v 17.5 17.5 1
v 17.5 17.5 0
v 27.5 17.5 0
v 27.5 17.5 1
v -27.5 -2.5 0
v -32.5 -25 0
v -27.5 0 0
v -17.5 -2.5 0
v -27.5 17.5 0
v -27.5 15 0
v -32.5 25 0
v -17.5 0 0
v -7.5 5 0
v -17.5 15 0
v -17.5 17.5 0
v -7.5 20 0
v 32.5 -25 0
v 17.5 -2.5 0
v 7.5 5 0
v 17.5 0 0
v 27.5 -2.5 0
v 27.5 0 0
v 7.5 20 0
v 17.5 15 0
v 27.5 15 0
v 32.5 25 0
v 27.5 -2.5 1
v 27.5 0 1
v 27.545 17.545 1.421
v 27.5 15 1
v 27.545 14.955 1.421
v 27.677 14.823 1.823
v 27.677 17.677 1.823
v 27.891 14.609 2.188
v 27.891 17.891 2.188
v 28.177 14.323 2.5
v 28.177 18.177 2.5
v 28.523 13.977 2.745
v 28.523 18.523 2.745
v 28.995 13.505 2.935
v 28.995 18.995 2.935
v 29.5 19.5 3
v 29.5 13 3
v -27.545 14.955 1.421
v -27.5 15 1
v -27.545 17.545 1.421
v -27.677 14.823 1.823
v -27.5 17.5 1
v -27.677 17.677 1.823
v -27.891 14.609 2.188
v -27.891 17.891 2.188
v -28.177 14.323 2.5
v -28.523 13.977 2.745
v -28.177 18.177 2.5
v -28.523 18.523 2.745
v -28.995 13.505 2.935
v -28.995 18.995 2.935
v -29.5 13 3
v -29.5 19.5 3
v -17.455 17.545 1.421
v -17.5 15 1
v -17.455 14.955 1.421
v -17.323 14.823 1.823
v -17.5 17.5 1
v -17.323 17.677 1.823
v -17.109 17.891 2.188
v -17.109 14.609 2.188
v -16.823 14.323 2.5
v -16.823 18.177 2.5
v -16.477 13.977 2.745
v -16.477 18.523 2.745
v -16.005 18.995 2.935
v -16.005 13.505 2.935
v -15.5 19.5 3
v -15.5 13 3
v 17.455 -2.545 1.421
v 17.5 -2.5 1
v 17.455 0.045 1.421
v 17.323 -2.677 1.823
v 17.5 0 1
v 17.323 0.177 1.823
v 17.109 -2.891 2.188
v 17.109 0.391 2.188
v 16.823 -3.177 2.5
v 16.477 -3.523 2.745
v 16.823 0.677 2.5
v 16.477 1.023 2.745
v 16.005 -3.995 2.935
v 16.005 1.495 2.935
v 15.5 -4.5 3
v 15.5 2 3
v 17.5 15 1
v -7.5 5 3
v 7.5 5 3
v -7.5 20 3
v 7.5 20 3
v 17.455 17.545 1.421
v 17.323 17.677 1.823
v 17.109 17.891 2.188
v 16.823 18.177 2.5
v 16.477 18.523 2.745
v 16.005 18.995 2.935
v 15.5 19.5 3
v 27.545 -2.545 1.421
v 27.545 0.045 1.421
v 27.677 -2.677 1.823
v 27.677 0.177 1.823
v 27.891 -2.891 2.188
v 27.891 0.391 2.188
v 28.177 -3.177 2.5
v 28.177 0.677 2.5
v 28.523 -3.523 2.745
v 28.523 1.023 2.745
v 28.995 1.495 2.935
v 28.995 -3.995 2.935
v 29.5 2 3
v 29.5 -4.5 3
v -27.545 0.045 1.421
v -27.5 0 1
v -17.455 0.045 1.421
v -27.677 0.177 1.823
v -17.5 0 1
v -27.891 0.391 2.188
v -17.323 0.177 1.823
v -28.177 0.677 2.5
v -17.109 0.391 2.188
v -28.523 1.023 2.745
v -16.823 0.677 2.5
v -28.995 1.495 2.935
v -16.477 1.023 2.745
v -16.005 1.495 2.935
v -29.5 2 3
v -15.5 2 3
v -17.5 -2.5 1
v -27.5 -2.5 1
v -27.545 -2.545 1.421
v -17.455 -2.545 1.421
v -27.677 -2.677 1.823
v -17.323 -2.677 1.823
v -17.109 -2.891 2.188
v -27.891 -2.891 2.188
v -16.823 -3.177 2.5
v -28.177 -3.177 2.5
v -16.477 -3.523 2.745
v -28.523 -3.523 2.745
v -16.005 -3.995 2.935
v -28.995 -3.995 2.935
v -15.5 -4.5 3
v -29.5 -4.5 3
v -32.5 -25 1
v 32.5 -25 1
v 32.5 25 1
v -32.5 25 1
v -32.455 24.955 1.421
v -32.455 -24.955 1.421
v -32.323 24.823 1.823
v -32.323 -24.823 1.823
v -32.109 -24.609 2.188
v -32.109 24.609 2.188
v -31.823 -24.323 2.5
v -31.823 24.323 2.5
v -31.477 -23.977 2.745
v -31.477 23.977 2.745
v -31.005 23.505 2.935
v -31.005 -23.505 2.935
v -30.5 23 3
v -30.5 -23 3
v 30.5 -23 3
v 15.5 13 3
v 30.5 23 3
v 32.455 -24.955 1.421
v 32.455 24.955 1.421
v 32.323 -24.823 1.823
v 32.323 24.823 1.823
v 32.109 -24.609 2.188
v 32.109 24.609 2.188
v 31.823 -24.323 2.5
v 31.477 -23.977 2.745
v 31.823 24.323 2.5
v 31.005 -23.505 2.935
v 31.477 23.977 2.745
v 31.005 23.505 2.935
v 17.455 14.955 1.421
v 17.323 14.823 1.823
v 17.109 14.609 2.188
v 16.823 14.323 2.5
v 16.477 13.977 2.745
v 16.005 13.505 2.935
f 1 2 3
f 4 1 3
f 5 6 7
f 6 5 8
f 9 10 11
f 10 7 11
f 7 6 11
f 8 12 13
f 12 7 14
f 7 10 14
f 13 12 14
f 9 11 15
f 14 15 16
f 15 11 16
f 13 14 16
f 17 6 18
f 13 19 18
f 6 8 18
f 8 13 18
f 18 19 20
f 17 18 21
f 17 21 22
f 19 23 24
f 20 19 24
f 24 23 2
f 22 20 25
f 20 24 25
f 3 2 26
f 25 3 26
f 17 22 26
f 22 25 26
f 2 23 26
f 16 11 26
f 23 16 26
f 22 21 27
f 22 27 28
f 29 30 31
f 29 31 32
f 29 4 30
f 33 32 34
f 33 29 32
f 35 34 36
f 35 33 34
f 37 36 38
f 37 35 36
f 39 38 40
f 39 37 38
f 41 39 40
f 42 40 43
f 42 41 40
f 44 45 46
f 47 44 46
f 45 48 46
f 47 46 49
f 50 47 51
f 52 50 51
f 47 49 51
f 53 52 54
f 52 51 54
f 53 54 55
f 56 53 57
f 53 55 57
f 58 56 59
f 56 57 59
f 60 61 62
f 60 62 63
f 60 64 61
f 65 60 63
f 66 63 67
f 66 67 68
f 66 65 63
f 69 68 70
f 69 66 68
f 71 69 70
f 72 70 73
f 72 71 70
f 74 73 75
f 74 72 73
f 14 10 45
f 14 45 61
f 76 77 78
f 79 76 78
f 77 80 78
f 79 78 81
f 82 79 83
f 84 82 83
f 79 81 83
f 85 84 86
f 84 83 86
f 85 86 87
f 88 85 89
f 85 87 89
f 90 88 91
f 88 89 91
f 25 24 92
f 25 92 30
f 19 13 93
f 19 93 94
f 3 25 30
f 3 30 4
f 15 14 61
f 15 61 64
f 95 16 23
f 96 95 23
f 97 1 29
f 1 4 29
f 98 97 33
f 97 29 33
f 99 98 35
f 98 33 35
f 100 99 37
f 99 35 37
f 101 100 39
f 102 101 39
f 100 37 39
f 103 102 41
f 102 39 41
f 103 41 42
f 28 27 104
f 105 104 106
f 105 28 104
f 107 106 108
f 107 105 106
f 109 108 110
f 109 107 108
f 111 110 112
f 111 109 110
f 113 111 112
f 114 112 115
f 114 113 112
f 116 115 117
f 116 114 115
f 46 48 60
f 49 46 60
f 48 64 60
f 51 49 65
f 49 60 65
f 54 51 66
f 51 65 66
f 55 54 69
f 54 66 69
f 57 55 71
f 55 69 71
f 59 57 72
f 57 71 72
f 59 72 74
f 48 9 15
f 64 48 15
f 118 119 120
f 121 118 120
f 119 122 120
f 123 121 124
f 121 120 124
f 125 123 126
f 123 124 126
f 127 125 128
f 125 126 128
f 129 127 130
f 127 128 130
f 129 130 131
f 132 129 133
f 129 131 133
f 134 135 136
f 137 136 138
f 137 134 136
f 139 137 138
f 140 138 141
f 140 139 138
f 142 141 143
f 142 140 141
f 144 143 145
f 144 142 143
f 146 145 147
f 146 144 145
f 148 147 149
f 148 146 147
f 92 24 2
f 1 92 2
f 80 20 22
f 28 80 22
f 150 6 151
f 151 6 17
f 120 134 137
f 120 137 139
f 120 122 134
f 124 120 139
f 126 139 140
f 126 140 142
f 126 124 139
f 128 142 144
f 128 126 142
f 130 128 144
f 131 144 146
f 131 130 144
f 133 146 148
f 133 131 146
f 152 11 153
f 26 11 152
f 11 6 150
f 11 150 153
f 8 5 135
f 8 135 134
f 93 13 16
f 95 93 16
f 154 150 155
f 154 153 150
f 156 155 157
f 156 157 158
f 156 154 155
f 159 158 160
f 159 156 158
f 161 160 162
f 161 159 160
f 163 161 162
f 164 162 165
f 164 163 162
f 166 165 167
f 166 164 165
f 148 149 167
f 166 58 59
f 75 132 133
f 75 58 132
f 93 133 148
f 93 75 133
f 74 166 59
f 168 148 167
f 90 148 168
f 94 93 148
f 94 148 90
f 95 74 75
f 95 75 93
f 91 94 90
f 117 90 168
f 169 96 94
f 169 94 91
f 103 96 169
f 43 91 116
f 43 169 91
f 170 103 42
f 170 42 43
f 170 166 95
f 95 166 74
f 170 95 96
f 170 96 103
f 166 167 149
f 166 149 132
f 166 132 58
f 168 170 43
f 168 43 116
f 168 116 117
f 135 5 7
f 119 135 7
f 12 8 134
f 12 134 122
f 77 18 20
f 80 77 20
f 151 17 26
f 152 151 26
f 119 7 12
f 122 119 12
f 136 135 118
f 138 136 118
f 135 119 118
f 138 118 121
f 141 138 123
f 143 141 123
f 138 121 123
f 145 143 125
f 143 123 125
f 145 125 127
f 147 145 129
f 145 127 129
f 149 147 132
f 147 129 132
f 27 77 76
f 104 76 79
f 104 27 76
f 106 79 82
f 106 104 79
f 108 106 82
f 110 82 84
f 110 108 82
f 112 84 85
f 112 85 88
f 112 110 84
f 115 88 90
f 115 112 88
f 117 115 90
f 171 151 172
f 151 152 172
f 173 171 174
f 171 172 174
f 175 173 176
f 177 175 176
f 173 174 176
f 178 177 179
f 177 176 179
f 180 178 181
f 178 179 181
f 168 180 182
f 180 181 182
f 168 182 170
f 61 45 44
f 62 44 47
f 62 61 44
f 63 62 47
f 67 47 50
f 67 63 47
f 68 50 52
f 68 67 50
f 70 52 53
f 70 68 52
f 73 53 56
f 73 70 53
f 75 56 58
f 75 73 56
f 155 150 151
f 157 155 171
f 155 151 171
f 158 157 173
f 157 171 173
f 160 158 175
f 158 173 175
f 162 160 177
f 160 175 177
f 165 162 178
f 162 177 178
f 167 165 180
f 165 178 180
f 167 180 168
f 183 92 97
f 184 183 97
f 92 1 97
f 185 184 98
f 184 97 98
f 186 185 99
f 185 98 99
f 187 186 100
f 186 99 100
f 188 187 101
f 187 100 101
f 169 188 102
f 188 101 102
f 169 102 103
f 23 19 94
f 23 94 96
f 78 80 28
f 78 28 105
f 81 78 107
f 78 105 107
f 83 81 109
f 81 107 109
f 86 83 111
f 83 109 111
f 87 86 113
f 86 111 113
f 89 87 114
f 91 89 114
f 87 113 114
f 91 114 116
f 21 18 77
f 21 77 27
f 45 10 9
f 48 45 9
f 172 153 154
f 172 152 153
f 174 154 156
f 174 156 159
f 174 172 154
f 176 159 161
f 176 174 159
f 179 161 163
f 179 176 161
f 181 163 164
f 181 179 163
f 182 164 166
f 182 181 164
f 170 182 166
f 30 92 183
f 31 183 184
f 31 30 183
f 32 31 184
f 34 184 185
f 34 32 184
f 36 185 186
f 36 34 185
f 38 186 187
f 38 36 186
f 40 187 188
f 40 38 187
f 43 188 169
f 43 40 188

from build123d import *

# Parameters (mm, degrees)
F0_W     = 65
F0_H     = 50
F0_W_2   = 10
F0_H_2   = 2.5
F0_W_3   = 15
F0_H_3   = 15
F1_DEPTH = 3
F2_R     = 2


with BuildPart() as f1:
    # F0 (on Top) → F1 (new body)
    with BuildSketch(Plane.XY):
        Rectangle(F0_W, F0_H)
        with Locations((-22.5, -1.25)):
            Rectangle(F0_W_2, F0_H_2, mode=Mode.SUBTRACT)
        with Locations((22.5, -1.25)):
            Rectangle(F0_W_2, F0_H_2, mode=Mode.SUBTRACT)
        with Locations((-22.5, 16.25)):
            Rectangle(F0_W_2, F0_H_2, mode=Mode.SUBTRACT)
        with Locations((0, 12.5)):
            Rectangle(F0_W_3, F0_H_3, mode=Mode.SUBTRACT)
        with Locations((22.5, 16.25)):
            Rectangle(F0_W_2, F0_H_2, mode=Mode.SUBTRACT)
    extrude(amount=F1_DEPTH)

    # F2
    f2_edges = [f1.edges().sort_by_distance(p)[0] for p in [
        (-22.5, 17.5, 3),
        (-22.5, 15, 3),
        (-27.5, 16.25, 3),
        (-17.5, 16.25, 3),
        (0, 25, 3),
        (-32.5, 0, 3),
        (-22.5, -2.5, 3),
        (0, -25, 3),
        (-22.5, 0, 3),
        (-27.5, -1.25, 3),
        (-17.5, -1.25, 3),
        (22.5, 15, 3),
        (22.5, 17.5, 3),
        (17.5, 16.25, 3),
        (27.5, 16.25, 3),
        (32.5, 0, 3),
        (22.5, 0, 3),
        (17.5, -1.25, 3),
        (22.5, -2.5, 3),
        (27.5, -1.25, 3),
    ]]
    fillet(f2_edges, radius=F2_R)


solid = f1.part
